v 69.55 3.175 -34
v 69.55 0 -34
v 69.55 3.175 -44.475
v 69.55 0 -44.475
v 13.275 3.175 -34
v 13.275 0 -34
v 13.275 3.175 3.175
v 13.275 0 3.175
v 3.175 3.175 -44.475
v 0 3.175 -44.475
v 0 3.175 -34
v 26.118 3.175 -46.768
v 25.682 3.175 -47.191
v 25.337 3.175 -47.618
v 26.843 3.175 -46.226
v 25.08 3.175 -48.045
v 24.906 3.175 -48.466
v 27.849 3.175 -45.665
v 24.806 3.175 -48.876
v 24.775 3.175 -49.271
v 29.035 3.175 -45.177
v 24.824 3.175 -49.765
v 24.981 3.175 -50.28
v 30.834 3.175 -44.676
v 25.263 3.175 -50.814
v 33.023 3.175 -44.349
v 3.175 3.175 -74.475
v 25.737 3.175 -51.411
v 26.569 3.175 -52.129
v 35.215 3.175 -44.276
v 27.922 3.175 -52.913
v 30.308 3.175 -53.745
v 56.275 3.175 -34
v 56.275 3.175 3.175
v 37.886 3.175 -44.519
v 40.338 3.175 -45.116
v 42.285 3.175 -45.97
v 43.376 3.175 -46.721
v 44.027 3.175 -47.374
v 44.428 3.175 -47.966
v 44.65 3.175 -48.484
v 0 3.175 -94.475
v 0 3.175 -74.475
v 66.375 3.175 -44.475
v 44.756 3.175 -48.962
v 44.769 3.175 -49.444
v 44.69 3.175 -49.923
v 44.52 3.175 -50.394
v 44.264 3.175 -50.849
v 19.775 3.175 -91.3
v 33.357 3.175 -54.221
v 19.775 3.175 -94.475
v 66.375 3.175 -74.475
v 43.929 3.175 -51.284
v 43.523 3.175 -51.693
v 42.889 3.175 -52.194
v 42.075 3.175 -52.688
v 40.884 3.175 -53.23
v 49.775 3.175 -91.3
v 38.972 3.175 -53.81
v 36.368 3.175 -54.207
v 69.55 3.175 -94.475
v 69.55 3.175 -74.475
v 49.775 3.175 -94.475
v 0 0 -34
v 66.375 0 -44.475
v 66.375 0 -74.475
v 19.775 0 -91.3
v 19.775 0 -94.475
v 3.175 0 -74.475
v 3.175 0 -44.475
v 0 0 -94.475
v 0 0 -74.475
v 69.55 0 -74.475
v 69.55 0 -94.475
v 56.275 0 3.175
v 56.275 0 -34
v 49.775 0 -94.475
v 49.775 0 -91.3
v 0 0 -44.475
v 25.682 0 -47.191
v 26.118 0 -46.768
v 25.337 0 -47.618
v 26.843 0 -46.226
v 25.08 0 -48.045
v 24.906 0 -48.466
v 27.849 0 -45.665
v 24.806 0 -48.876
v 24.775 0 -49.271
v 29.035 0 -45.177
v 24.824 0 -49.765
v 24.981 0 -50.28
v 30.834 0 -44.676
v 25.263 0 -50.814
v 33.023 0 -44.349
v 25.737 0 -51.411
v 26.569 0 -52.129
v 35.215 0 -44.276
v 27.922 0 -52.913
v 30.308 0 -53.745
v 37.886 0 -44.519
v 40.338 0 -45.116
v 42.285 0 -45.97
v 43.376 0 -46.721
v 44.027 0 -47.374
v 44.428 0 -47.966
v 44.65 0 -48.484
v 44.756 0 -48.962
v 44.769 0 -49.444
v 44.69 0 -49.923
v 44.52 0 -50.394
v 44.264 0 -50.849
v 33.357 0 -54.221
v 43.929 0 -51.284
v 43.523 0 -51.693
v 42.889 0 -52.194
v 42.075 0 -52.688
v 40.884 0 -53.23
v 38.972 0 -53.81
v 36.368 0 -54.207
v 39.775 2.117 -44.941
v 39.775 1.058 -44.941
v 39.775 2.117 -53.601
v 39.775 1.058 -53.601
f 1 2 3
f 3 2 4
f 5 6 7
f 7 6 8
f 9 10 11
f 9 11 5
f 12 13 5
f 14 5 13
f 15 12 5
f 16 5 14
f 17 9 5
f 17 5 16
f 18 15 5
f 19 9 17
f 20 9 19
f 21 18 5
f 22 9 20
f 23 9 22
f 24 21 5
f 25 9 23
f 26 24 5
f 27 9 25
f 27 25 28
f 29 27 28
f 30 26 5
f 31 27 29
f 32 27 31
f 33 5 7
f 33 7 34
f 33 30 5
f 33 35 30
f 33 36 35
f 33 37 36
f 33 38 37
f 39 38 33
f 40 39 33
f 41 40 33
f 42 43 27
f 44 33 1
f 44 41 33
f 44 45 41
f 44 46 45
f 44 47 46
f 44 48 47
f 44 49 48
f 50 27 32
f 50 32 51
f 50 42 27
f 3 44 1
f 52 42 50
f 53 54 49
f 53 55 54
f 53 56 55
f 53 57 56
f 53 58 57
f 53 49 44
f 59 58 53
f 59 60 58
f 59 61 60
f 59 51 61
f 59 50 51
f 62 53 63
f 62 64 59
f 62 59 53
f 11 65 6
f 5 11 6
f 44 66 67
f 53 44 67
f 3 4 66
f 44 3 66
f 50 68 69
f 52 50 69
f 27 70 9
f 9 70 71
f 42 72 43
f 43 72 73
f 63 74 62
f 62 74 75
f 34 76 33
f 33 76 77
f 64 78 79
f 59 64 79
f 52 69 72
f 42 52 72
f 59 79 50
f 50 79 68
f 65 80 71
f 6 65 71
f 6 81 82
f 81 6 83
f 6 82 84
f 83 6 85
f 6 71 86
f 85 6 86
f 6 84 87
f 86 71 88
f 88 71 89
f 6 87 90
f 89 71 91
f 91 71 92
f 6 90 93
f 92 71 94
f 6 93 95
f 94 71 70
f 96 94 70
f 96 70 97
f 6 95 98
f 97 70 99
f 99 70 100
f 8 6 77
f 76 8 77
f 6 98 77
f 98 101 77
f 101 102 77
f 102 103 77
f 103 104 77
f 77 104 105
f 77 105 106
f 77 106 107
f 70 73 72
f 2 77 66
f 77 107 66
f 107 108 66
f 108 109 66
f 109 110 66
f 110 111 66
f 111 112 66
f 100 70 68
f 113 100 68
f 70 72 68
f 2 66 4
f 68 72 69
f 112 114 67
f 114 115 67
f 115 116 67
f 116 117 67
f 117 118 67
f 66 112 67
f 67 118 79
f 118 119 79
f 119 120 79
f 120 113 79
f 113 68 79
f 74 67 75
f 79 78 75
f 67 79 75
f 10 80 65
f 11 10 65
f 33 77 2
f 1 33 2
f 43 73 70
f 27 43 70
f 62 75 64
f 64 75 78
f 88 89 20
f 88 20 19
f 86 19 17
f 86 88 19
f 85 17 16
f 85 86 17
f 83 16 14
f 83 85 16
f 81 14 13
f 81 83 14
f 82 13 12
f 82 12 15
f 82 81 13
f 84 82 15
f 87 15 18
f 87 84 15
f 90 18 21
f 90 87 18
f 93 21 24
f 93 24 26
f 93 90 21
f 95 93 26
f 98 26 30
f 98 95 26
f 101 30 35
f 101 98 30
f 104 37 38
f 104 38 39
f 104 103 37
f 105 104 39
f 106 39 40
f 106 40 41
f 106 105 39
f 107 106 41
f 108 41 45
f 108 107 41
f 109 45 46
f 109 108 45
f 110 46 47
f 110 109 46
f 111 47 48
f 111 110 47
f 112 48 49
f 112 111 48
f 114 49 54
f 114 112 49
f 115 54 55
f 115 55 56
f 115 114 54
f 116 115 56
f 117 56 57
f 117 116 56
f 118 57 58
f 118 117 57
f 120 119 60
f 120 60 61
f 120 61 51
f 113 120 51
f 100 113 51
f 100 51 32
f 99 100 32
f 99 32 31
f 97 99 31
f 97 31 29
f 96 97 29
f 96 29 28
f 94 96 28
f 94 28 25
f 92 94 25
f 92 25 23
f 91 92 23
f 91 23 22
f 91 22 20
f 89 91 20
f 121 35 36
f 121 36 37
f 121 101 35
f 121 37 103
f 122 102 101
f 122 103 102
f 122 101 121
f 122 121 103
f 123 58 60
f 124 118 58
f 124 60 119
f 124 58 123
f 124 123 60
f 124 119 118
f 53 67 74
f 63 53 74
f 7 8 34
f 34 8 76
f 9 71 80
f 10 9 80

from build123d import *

# Parameters (mm, degrees)
BOSS_EXTRUDE1_DEPTH = 3.175


with BuildPart() as part:
    # Sketch1 → Boss-Extrude1 (new body)
    with BuildSketch(Plane(origin=(0, 0, 0), x_dir=(1, 0, 0), z_dir=(0, 1, 0))):
        Polygon((49.775, 91.3), (19.775, 91.3), (19.775, 94.475), (0, 94.475), (0, 74.475), (3.175, 74.475), (3.175, 44.475), (0, 44.475), (0, 34), (13.275, 34), (13.275, -3.175), (56.275, -3.175), (56.275, 34), (69.55, 34), (69.55, 44.475), (66.375, 44.475), (66.375, 74.475), (69.55, 74.475), (69.55, 94.475), (49.775, 94.475), align=None)
        with BuildLine():
            add(Edge.make_bspline(
                [(24.775, 49.271255677), (24.775, 40.611001639), (39.775, 44.941128658), (54.775, 49.271255677), (39.775, 53.601382696), (24.775, 57.931509715), (24.775, 49.271255677)],
                knots=[0, 0, 0, 2.094395102, 2.094395102, 4.188790205, 4.188790205, 6.283185307, 6.283185307, 6.283185307], degree=2, weights=[1, 0.5, 1, 0.5, 1, 0.5, 1]))
        make_face(mode=Mode.SUBTRACT)
    extrude(amount=BOSS_EXTRUDE1_DEPTH)


solid = part.part
